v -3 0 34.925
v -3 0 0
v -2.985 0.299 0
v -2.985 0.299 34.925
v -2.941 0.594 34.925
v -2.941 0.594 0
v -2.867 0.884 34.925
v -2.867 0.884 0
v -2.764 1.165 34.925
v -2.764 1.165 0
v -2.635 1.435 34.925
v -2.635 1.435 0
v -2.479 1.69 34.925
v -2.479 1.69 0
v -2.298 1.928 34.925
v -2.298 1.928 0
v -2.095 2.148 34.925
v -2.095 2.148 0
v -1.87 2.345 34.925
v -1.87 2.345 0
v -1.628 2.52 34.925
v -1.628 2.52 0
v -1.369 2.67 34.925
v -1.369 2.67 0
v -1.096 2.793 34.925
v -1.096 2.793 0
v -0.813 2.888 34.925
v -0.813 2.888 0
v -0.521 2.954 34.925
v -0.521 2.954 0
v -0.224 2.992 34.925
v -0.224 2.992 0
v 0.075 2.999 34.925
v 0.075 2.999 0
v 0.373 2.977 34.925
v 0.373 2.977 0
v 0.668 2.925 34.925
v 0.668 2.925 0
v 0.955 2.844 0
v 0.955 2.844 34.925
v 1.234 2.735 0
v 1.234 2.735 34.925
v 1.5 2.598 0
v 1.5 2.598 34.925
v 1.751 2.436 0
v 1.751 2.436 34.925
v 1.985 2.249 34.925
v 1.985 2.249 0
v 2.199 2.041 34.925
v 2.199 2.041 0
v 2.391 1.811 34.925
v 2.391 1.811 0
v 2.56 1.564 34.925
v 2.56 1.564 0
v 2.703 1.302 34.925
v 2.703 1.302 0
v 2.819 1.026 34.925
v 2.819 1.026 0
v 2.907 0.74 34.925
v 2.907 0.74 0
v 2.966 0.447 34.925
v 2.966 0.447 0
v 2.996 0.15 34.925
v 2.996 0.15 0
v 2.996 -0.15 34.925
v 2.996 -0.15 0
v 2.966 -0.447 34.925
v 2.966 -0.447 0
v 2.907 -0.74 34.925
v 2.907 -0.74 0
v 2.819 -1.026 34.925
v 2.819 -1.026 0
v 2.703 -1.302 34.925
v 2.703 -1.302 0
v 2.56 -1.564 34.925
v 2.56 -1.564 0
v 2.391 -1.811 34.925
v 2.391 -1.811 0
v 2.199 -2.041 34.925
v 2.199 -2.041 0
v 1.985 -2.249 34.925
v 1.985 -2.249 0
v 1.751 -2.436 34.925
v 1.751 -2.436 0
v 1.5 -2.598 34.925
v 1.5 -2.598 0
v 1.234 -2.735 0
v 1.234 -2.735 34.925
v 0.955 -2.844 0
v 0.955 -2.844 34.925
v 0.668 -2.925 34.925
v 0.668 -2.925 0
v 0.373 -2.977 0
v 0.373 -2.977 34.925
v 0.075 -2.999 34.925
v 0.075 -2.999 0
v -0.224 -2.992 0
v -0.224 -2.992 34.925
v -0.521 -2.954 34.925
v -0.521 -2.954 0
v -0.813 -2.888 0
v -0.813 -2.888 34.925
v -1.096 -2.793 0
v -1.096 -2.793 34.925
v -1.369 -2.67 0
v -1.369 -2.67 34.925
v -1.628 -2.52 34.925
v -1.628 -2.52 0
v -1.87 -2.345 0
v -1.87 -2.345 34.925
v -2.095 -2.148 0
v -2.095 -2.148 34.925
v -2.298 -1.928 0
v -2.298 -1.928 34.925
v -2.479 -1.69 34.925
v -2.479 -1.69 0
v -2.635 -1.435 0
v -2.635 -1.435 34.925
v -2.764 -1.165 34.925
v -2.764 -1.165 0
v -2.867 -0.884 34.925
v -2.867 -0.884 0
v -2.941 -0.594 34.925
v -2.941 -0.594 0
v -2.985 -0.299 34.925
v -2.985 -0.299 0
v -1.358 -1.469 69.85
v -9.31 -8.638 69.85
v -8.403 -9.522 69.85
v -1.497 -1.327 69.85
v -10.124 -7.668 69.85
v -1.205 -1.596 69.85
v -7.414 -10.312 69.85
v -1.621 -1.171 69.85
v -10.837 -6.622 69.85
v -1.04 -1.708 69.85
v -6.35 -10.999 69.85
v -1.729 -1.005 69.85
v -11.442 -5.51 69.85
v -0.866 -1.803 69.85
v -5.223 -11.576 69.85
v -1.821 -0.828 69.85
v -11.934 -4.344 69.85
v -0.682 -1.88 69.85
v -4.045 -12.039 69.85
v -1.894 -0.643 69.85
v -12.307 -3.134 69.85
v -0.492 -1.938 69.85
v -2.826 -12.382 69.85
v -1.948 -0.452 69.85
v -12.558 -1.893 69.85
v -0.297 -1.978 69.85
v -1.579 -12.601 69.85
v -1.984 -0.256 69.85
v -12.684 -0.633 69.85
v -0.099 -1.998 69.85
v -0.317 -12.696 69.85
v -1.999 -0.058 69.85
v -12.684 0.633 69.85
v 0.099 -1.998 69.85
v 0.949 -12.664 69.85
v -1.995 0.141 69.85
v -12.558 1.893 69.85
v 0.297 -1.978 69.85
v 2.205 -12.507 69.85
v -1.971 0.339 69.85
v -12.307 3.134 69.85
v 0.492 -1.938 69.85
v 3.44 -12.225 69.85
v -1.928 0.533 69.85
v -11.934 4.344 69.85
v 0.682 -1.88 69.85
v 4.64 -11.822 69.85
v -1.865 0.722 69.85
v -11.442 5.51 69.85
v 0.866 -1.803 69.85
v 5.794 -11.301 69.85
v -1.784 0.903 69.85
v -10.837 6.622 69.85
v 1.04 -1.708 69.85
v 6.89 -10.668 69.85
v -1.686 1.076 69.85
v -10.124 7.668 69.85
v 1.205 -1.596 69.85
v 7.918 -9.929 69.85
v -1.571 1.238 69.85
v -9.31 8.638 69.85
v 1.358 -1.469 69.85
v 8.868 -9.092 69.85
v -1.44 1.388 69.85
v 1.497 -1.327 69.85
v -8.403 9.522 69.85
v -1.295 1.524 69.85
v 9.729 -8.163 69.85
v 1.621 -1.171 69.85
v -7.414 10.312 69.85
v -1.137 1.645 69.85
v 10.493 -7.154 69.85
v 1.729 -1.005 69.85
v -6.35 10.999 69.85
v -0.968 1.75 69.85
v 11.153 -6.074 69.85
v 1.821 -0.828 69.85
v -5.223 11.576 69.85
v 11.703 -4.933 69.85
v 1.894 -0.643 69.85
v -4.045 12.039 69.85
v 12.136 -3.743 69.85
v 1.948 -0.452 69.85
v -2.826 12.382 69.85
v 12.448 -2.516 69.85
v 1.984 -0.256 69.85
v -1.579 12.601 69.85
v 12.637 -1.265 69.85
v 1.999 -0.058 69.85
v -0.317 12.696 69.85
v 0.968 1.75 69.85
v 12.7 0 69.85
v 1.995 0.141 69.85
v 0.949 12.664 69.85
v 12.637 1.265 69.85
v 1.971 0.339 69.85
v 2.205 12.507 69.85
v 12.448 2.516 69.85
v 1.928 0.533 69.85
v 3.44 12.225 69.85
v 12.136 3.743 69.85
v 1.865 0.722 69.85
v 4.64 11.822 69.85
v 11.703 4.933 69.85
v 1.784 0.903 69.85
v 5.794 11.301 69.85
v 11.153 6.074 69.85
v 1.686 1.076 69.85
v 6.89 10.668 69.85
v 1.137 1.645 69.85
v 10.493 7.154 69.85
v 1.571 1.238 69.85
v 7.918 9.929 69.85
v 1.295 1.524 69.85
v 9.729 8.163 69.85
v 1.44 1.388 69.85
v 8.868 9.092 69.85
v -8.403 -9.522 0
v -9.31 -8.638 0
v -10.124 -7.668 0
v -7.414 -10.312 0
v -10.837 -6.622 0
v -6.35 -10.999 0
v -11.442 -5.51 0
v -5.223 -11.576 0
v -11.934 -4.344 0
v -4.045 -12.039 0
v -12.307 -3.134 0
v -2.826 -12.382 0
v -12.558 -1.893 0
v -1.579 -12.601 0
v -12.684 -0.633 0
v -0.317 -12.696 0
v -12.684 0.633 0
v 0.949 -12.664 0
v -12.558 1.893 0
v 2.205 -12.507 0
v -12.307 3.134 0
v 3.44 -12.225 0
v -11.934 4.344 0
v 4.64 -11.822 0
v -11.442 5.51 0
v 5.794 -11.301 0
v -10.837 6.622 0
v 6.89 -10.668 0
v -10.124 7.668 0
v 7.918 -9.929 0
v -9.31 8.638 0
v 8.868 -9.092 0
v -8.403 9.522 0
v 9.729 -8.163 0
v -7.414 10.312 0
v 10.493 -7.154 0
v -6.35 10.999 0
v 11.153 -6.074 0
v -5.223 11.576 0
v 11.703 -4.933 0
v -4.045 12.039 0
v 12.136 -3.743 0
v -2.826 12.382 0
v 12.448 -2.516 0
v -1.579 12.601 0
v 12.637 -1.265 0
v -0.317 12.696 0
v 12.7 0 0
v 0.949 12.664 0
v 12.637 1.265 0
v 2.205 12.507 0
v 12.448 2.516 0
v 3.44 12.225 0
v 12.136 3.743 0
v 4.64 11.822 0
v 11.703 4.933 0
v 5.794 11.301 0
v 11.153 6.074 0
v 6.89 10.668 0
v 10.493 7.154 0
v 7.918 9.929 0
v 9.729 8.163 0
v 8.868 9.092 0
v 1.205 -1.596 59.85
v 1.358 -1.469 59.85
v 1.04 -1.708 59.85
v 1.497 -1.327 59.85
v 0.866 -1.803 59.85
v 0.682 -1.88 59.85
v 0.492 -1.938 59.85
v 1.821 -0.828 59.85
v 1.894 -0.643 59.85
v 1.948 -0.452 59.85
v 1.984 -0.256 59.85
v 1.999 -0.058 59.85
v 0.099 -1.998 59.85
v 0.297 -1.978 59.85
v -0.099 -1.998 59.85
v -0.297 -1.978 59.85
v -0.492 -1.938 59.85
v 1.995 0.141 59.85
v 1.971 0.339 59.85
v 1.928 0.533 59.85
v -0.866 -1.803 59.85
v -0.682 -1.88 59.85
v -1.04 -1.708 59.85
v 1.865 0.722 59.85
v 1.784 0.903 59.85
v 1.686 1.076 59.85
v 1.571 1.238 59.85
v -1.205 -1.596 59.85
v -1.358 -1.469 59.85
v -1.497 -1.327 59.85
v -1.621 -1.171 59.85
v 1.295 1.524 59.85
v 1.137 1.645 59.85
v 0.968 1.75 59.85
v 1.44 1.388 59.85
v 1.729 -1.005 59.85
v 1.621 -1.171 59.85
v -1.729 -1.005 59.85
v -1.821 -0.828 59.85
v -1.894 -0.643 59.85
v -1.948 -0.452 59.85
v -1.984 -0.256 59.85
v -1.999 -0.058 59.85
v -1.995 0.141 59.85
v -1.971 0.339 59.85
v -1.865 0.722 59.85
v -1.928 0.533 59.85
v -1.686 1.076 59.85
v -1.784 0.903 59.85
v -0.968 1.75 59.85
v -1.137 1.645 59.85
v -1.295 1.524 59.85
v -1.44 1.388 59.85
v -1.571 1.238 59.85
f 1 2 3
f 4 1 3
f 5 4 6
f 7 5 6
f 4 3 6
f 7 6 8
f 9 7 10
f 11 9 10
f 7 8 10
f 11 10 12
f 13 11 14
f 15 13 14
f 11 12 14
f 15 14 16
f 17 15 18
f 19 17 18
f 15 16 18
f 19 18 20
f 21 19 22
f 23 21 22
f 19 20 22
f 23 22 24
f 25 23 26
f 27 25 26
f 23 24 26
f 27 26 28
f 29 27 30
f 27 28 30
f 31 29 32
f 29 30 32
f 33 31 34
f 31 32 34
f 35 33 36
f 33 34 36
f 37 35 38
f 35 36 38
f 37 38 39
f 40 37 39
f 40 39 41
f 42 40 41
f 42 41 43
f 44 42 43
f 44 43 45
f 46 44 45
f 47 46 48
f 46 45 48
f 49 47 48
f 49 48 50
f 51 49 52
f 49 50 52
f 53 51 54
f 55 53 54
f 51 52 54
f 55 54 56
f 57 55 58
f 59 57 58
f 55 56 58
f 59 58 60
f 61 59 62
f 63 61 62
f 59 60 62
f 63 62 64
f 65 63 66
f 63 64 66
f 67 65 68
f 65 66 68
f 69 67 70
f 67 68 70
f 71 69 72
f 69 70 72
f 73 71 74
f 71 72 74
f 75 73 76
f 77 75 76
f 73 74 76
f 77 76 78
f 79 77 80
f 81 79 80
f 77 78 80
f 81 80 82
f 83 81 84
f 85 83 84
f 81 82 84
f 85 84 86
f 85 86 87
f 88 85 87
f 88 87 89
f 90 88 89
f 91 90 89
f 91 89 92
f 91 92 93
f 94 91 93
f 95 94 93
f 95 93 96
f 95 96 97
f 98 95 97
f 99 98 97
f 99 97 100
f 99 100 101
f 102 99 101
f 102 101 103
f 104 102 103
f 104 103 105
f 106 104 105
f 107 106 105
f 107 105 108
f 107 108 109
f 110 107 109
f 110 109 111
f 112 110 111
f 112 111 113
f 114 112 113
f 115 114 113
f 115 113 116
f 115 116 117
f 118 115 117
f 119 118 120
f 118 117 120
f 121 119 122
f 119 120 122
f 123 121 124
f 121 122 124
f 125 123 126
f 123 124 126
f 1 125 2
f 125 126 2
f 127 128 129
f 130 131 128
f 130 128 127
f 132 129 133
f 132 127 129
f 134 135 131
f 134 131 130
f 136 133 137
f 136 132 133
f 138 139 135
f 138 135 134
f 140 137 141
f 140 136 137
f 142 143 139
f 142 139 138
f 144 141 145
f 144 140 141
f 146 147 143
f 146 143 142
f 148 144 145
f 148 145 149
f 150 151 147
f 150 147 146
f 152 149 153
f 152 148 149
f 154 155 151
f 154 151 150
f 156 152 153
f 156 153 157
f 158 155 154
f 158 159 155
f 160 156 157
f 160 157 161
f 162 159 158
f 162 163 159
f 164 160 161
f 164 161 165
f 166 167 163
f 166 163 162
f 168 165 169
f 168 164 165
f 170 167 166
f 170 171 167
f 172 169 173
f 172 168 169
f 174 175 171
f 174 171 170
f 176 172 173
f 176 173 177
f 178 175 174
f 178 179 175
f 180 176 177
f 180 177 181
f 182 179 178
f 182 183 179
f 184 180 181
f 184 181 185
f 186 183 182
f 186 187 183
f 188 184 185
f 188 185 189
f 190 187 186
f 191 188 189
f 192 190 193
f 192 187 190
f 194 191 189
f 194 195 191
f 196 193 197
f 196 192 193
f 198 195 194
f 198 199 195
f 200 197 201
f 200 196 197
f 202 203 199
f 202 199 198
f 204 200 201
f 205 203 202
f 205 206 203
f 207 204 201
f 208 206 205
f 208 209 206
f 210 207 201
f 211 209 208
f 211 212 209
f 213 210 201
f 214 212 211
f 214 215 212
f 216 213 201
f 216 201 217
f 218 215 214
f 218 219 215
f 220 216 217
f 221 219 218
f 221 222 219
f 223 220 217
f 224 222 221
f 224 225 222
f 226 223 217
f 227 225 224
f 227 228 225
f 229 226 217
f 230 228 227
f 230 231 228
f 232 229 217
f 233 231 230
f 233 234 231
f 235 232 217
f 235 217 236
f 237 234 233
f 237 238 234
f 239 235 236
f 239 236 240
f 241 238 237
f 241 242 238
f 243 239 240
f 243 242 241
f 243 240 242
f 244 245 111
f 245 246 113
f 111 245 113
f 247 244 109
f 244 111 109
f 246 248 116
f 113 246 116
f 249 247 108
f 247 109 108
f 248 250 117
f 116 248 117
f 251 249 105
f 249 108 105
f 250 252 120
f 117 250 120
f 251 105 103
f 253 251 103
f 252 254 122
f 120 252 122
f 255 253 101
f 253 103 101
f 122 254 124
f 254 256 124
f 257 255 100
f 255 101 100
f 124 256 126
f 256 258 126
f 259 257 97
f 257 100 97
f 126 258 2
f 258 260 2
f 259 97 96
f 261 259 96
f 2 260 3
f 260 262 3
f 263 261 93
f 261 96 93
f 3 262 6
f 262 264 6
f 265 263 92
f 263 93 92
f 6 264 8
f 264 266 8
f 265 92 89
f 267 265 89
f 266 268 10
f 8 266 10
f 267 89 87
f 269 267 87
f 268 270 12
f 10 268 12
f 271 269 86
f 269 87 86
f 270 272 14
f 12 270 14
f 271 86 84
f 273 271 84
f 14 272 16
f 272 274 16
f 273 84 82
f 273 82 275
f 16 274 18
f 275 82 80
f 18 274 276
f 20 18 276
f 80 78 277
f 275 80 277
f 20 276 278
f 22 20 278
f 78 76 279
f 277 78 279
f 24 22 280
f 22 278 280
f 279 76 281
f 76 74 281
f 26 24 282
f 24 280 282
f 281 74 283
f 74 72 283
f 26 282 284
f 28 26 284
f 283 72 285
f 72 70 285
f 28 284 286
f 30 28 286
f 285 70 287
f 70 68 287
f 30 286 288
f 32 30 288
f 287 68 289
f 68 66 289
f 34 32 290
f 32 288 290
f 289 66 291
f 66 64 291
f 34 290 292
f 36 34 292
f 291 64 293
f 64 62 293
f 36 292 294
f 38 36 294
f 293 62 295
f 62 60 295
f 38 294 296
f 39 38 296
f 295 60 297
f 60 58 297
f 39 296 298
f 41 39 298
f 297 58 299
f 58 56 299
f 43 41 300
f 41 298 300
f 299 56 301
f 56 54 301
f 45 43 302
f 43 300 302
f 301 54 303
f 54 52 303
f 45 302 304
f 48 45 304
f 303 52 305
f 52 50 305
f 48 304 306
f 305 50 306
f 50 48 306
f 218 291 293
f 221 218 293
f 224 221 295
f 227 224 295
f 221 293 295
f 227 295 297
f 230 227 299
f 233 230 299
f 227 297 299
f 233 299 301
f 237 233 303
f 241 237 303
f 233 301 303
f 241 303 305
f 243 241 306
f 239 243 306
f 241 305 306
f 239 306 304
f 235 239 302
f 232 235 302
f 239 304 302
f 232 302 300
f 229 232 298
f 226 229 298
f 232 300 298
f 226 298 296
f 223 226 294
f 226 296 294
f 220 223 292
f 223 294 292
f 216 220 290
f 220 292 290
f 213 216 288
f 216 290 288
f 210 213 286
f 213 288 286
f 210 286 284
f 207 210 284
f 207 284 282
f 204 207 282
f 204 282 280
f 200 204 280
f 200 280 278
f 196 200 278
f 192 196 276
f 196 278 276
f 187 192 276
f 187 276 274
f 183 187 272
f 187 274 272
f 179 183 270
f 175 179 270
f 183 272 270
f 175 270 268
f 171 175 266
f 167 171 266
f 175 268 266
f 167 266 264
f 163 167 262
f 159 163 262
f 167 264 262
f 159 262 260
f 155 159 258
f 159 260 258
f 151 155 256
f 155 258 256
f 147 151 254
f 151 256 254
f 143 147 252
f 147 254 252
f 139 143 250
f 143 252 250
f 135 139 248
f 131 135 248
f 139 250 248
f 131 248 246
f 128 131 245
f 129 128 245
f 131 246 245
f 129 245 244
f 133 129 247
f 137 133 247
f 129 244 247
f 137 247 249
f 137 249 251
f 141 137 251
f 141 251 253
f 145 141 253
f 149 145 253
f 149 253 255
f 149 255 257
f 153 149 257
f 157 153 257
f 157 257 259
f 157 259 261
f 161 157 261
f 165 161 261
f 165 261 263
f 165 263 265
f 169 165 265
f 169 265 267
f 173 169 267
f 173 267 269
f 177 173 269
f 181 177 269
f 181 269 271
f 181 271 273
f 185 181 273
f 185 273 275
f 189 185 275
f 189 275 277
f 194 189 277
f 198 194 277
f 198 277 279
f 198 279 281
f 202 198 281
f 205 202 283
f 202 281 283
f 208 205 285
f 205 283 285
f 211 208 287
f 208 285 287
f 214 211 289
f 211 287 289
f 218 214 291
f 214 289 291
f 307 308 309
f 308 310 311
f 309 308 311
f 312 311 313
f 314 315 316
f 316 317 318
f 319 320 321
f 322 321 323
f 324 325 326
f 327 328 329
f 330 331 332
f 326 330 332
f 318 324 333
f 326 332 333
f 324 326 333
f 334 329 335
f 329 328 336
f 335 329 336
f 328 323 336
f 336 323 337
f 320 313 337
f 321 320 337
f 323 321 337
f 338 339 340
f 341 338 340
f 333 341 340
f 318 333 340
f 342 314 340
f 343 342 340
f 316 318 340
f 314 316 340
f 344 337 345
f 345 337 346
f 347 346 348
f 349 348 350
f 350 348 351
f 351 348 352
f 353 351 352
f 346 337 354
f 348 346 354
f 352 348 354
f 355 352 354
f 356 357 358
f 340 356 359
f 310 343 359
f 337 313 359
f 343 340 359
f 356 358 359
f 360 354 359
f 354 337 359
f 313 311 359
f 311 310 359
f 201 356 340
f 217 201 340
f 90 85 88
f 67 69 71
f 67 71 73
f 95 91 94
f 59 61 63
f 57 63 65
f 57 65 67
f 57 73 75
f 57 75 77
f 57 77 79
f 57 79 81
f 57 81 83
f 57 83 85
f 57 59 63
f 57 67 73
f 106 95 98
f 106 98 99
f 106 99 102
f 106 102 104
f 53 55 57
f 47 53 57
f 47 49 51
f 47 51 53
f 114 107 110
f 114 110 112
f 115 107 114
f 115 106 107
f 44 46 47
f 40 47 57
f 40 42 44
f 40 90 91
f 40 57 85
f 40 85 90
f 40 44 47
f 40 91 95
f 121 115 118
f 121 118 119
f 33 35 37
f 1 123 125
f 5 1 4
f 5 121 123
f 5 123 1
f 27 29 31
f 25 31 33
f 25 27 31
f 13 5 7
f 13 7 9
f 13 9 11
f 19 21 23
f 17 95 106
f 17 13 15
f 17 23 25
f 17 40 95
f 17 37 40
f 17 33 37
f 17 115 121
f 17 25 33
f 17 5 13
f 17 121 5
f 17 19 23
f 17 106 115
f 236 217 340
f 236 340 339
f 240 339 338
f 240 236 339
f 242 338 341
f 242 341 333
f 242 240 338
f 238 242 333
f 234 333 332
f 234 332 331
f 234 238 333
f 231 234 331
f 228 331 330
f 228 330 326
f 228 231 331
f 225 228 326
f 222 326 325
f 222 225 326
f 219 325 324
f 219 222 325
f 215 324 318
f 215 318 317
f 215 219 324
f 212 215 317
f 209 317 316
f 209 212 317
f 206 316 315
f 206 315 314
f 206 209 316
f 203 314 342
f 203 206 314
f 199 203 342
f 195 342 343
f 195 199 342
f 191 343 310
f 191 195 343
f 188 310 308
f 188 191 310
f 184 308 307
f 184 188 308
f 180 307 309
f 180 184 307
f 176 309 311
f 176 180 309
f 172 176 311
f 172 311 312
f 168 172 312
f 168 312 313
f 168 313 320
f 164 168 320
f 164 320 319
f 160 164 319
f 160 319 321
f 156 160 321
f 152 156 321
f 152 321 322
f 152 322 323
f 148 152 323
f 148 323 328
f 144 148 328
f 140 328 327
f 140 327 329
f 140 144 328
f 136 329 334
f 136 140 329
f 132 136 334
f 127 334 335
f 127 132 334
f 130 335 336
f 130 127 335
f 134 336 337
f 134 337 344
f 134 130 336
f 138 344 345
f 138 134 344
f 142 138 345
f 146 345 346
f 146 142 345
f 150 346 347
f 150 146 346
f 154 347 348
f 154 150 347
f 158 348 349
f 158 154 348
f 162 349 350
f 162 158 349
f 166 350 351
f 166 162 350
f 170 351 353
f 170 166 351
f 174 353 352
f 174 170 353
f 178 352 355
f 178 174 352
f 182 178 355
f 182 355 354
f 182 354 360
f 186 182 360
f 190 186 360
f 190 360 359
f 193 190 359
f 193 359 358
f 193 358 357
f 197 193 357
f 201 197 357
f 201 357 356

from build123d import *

# Parameters (mm, degrees)
SKETCH1_R           = 12.7
BOSS_EXTRUDE1_DEPTH = 69.85
CUT_EXTRUDE1_DEPTH  = 10
SKETCH3_R           = 2.999994
CUT_EXTRUDE2_DEPTH  = 34.925


with BuildPart() as part:
    # Sketch1 → Boss-Extrude1 (new body)
    with BuildSketch(Plane.XY):
        Circle(SKETCH1_R)
    extrude(amount=BOSS_EXTRUDE1_DEPTH)

    # Sketch2 → Cut-Extrude1 (cut)
    with BuildSketch(Plane.XY.offset(69.85)):
        with BuildLine():
            Line((-0.968245837, 1.75), (0.968245837, 1.75))
            ThreePointArc((0.968245837, 1.75), (0, -2), (-0.968245837, 1.75))
        make_face()
    extrude(amount=-CUT_EXTRUDE1_DEPTH, mode=Mode.SUBTRACT)

    # Sketch3 → Cut-Extrude2 (cut)
    with BuildSketch(Plane(origin=(0, 0, 0), x_dir=(-1, 0, 0), z_dir=(0, 0, -1))):
        Circle(SKETCH3_R)
    extrude(amount=-CUT_EXTRUDE2_DEPTH, mode=Mode.SUBTRACT)


solid = part.part
